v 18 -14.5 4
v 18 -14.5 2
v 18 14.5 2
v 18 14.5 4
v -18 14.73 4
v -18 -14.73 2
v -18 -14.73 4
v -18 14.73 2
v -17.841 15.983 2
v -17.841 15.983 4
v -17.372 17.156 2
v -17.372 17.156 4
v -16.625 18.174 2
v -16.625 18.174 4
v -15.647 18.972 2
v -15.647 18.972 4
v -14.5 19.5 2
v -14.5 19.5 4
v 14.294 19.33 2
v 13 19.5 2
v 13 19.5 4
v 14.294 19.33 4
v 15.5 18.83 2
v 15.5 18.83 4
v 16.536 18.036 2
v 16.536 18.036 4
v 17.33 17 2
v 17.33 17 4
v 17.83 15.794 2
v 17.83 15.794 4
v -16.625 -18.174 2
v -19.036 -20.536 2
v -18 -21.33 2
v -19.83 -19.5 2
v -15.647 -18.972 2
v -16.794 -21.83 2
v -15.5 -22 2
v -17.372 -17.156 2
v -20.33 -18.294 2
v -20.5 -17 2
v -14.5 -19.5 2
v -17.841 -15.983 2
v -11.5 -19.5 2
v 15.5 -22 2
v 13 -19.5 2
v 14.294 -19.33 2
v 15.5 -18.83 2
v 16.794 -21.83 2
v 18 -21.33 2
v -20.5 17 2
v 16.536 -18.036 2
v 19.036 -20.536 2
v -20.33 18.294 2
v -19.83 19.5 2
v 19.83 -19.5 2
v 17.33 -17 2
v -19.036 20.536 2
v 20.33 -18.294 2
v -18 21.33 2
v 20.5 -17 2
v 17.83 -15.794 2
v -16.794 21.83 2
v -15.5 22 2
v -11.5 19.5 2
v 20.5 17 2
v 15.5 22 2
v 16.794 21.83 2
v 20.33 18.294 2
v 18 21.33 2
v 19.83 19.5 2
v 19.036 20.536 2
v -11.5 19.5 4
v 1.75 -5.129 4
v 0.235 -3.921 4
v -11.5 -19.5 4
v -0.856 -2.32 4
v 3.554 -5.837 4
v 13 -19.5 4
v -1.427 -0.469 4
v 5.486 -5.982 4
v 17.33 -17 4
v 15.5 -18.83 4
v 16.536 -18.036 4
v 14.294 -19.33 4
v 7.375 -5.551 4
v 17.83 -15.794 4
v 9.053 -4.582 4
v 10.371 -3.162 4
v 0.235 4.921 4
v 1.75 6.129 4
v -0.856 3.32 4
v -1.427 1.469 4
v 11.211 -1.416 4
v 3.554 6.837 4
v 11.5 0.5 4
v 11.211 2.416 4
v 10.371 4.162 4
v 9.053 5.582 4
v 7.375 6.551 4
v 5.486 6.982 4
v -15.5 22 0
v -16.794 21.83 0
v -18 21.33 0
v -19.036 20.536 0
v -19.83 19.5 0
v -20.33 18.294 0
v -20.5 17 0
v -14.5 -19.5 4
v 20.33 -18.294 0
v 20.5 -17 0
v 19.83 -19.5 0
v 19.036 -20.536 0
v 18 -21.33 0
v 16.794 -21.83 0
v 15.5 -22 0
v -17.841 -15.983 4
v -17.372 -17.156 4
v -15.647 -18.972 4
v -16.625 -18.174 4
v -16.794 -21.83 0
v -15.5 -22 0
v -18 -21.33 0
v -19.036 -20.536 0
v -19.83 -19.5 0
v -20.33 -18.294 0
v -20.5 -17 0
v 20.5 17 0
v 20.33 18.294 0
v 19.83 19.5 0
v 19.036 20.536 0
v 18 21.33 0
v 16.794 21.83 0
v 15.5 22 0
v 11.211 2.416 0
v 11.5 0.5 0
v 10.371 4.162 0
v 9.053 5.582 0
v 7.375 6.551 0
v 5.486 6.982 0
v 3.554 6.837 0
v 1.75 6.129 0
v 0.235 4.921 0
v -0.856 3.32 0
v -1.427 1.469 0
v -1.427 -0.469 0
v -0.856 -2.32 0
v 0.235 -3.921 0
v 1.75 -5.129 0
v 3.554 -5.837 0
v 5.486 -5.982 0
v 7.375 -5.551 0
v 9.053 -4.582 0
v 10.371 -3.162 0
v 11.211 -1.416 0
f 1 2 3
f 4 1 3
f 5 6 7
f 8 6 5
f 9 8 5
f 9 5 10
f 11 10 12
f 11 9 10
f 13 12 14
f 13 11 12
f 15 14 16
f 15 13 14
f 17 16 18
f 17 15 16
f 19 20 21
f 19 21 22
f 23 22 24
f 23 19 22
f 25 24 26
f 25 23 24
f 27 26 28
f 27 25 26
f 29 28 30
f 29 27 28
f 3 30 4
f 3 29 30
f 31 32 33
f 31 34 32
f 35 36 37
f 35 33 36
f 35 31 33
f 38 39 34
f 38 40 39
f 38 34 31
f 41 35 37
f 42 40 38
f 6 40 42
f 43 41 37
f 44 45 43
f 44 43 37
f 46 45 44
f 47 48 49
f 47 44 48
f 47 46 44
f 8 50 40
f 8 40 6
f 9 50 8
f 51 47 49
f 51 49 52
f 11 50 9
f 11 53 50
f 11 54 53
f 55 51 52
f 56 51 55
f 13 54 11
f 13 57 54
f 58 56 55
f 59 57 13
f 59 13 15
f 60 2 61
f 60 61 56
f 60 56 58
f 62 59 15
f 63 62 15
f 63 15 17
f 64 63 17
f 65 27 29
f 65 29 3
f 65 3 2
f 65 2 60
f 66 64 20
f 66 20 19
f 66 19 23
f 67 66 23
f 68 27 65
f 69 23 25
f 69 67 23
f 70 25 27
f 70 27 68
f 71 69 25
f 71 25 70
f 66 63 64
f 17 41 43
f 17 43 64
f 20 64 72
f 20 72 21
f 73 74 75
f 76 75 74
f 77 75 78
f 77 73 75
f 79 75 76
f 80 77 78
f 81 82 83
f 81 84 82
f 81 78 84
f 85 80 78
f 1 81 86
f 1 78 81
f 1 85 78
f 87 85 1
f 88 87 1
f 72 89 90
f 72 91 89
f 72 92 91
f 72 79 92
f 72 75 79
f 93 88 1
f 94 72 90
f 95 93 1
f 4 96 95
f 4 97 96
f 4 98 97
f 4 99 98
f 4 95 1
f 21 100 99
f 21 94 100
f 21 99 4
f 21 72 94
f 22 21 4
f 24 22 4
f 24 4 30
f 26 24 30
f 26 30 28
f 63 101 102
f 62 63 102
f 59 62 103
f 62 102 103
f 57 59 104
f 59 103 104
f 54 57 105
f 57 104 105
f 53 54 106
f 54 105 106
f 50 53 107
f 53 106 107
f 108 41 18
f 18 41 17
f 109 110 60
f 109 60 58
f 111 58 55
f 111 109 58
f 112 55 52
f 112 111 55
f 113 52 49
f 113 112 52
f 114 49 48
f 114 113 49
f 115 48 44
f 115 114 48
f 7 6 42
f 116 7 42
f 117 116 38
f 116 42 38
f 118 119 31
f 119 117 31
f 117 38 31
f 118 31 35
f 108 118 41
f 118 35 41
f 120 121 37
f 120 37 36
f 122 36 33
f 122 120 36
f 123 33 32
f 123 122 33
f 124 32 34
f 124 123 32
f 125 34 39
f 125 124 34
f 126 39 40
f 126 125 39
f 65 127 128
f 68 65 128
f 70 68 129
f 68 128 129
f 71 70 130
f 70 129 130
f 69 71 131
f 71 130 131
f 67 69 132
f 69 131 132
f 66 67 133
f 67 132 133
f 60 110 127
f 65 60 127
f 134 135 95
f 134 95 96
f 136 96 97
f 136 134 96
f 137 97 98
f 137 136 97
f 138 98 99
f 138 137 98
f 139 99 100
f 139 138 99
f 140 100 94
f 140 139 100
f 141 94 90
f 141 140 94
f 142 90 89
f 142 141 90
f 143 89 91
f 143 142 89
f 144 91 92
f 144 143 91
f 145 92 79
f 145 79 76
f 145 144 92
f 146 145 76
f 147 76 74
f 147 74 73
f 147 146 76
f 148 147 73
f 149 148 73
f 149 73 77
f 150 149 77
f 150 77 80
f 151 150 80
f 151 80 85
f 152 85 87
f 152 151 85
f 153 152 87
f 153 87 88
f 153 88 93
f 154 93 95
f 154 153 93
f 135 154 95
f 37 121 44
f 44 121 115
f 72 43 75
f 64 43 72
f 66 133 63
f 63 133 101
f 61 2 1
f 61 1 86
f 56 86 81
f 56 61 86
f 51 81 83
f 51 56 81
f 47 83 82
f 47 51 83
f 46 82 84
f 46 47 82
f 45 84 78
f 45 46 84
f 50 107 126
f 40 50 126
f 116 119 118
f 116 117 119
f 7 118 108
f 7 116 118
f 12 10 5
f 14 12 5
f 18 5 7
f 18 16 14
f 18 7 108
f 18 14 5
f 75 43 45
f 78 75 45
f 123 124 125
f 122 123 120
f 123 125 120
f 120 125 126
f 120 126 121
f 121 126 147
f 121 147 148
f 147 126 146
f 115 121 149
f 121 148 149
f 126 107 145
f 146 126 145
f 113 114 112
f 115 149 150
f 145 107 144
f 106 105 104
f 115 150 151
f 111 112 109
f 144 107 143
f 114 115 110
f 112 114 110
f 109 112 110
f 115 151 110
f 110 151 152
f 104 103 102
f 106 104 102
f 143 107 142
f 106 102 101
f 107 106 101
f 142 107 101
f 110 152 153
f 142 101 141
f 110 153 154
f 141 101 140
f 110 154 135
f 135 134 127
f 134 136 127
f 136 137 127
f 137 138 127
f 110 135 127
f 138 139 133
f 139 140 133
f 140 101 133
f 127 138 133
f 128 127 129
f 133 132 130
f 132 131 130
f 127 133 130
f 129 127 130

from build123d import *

# Parameters (mm, degrees)
F0_W        = 3
F0_H        = 2.5
F0_H_2      = 39
F1_DEPTH    = 2
F0_W_2      = 3.5
F0_W_3      = 29.5
F0_R        = 6.5
F2_DEPTH    = 4
F3_T1_DEPTH = 13.9242400177
F3_T3_DEPTH = 14.5
F3_T5_DEPTH = 27


# Not quite as in the source:
# - a fillet or chamfer that OpenCascade refuses, or shapes differently, is made with other operations: its cross-section is extruded or revolved along the edge and cut away or added


with BuildPart() as f1:
    # F0 (on Top) → F1 (new body)
    with BuildSketch(Plane.XY):
        Polygon((20.5, -22), (20.5, 22), (-11.5, 22), (-11.5, 19.5), (18, 19.5), (18, -19.5), (-11.5, -19.5), (-11.5, -22), align=None)
        with Locations((-13, 20.75)):
            Rectangle(F0_W, F0_H)
        Polygon((-14.5, 19.5), (-14.5, 22), (-20.5, 22), (-20.5, -22), (-14.5, -22), (-14.5, -19.5), (-18, -19.5), (-18, 19.5), align=None)
        with Locations((-13, -20.75)):
            Rectangle(F0_W, F0_H)
        with Locations((-13, 0)):
            Rectangle(F0_W, F0_H_2)
    extrude(amount=F1_DEPTH)

    # F0 (on Top) → F2 (join)
    with BuildSketch(Plane.XY):
        with Locations((-16.25, 0)):
            Rectangle(F0_W_2, F0_H_2)
        with Locations((3.25, 0)):
            Rectangle(F0_W_3, F0_H_2)
        with Locations((5, 0.5)):
            Circle(F0_R, mode=Mode.SUBTRACT)
    extrude(amount=F2_DEPTH)

    # F3: fillet of radius 5 on 8 edges, made by hand

    # F3_s2 → F3_t1 (cut)
    with BuildSketch(Plane.XY.offset(2)):
        with BuildLine():
            ThreePointArc((-18, 14.7303039929), (-17.0311288741, 17.6883438845), (-14.5, 19.5))
            Line((-14.5, 19.5), (-18, 19.5))
            Line((-18, 19.5), (-18, 14.7303039929))
        make_face()
        with BuildLine():
            ThreePointArc((-18, -14.7303039929), (-17.0311288741, -17.6883438845), (-14.5, -19.5))
            Line((-14.5, -19.5), (-18, -19.5))
            Line((-18, -19.5), (-18, -14.7303039929))
        make_face()
    extrude(amount=F3_T1_DEPTH, mode=Mode.SUBTRACT)

    # F3_s4 → F3_t3 (cut)
    with BuildSketch(Plane.XY.offset(2)):
        with BuildLine():
            ThreePointArc((13, 19.5), (16.5355339059, 18.0355339059), (18, 14.5))
            Line((18, 14.5), (18, 19.5))
            Line((18, 19.5), (13, 19.5))
        make_face()
        with BuildLine():
            ThreePointArc((18, -14.5), (16.5355339059, -18.0355339059), (13, -19.5))
            Line((13, -19.5), (18, -19.5))
            Line((18, -19.5), (18, -14.5))
        make_face()
    extrude(amount=F3_T3_DEPTH, mode=Mode.SUBTRACT)

    # F3_s6 → F3_t5 (cut)
    with BuildSketch(Plane.XY.offset(-12.5)):
        with BuildLine():
            ThreePointArc((-15.5, 22), (-19.0355339059, 20.5355339059), (-20.5, 17))
            Line((-20.5, 17), (-20.5, 22))
            Line((-20.5, 22), (-15.5, 22))
        make_face()
        with BuildLine():
            ThreePointArc((-15.5, -22), (-19.0355339059, -20.5355339059), (-20.5, -17))
            Line((-20.5, -17), (-20.5, -22))
            Line((-20.5, -22), (-15.5, -22))
        make_face()
        with BuildLine():
            ThreePointArc((20.5, 17), (19.0355339059, 20.5355339059), (15.5, 22))
            Line((15.5, 22), (20.5, 22))
            Line((20.5, 22), (20.5, 17))
        make_face()
        with BuildLine():
            ThreePointArc((20.5, -17), (19.0355339059, -20.5355339059), (15.5, -22))
            Line((15.5, -22), (20.5, -22))
            Line((20.5, -22), (20.5, -17))
        make_face()
    extrude(amount=F3_T5_DEPTH, mode=Mode.SUBTRACT)


solid = f1.part
